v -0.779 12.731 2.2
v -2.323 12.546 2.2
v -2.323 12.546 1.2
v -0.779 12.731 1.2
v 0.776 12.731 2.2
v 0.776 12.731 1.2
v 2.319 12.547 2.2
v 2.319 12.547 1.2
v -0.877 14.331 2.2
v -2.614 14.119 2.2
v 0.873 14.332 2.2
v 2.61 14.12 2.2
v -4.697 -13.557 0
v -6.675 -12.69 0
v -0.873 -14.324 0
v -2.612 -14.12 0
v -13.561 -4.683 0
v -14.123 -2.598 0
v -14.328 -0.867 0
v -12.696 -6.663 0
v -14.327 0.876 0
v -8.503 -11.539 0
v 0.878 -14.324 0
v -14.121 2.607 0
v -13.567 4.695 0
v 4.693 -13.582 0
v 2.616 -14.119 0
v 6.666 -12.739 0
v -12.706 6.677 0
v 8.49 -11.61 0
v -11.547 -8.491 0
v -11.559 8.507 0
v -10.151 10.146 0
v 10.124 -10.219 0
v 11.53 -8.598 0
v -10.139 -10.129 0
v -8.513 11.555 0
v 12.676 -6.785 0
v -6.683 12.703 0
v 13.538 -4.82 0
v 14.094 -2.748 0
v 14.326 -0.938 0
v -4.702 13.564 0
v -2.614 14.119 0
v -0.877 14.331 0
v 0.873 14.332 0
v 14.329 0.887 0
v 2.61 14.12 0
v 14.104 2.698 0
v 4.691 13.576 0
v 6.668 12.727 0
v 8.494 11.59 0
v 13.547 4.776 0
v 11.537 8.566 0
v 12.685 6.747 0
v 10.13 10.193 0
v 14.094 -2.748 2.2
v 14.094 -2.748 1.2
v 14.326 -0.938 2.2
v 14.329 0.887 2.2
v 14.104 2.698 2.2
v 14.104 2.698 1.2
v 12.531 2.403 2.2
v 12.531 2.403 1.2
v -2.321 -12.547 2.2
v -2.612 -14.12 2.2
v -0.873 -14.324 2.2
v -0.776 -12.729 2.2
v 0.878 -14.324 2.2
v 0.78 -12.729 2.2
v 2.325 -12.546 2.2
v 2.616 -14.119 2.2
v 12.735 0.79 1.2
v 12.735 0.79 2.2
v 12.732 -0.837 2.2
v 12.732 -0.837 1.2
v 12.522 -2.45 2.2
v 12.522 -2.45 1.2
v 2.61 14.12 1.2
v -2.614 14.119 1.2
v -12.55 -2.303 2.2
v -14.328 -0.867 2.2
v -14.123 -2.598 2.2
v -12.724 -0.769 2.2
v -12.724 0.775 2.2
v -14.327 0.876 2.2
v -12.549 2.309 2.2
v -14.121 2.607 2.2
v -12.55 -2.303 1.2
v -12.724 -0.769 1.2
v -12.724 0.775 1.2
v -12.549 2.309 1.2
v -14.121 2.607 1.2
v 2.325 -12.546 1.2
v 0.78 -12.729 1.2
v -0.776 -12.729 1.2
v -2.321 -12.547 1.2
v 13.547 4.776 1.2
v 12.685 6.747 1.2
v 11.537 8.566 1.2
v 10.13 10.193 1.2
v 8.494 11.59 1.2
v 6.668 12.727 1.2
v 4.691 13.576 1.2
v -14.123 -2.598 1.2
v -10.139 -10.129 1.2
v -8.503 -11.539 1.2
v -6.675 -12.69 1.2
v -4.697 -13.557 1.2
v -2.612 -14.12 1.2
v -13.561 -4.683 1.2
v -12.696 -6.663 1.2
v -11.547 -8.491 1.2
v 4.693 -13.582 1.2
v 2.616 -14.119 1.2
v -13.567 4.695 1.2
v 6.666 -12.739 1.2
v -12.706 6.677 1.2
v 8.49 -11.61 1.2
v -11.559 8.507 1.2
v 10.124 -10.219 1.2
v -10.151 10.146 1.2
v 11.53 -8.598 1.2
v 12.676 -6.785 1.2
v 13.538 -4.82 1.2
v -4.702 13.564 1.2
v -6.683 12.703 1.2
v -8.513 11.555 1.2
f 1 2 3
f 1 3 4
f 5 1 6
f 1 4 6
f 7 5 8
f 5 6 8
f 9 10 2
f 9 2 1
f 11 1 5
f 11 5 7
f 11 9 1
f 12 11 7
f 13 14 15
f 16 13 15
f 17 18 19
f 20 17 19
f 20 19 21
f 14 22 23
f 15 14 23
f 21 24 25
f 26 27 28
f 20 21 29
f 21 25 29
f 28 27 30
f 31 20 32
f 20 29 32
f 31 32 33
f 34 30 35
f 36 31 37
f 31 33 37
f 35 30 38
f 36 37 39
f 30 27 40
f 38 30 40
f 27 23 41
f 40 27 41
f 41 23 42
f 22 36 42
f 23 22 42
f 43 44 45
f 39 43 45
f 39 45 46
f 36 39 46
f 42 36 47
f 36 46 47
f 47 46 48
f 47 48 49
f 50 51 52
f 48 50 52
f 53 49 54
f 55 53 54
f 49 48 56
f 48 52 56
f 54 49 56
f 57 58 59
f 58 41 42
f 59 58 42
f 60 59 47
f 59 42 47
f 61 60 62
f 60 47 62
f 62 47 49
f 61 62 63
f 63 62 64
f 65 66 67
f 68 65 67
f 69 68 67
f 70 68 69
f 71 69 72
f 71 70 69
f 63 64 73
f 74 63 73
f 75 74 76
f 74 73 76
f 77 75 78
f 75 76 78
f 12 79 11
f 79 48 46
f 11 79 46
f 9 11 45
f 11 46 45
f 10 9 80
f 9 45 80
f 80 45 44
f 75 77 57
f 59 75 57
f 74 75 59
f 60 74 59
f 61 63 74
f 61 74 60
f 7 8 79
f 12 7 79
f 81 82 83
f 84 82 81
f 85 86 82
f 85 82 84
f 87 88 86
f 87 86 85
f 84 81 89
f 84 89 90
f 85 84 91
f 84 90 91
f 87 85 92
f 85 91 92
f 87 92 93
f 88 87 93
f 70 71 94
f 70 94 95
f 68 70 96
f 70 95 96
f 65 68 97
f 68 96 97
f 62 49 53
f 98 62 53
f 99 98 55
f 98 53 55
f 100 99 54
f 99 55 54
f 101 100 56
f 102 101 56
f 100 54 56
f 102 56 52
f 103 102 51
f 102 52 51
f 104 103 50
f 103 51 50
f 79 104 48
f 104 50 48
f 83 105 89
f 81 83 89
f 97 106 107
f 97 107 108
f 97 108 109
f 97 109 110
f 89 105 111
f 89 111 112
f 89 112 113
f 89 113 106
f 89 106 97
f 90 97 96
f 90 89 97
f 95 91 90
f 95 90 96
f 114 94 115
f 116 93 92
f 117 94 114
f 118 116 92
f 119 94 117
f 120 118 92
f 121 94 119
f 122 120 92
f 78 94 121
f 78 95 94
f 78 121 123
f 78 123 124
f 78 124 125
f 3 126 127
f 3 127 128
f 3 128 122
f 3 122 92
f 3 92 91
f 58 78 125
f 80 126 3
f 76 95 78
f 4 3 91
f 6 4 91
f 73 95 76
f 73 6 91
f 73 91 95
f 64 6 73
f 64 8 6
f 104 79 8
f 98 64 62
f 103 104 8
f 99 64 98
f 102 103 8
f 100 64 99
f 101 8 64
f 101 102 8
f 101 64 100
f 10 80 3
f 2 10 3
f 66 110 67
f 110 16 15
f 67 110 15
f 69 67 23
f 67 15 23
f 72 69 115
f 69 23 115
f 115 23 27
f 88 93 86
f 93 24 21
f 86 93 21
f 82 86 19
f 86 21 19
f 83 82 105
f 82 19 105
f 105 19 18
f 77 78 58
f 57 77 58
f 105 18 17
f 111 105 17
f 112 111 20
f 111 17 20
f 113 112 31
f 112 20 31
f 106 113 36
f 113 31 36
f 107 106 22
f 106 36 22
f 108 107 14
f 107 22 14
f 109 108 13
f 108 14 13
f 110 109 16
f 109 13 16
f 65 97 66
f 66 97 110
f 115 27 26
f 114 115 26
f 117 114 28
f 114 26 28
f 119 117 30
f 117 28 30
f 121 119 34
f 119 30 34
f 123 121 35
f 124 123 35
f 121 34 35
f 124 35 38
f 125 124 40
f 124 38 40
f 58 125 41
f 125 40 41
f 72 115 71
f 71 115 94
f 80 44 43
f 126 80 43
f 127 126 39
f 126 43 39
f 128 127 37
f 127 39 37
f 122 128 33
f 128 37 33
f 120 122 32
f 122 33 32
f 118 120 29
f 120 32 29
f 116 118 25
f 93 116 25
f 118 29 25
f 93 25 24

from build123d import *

# Parameters (mm, degrees)
F1_DEPTH = 1.2
F2_DEPTH = 2.2


with BuildPart() as f1:
    # F0 (on Top) → F1 (new body)
    with BuildSketch(Plane.XY):
        with BuildLine():
            ThreePointArc((-2.61423, 14.119491), (-10.150846, 10.145596), (-14.120842, 2.606925))
            Line((-14.120842, 2.606925), (-12.54888, 2.308583))
            ThreePointArc((-12.54888, 2.308583), (-12.746063, 0.003032), (-12.549977, -2.302612))
            Line((-12.549977, -2.302612), (-14.122546, -2.597676))
            ThreePointArc((-14.122546, -2.597676), (-10.138682, -10.128644), (-2.611663, -14.119966))
            Line((-2.611663, -14.119966), (-2.320738, -12.546638))
            ThreePointArc((-2.320738, -12.546638), (0.002028, -12.751949), (2.324728, -12.545899))
            Line((2.324728, -12.545899), (2.616123, -14.119141))
            ThreePointArc((2.616123, -14.119141), (10.123734, -10.218797), (14.094074, -2.747967))
            Line((14.094074, -2.747967), (12.522112, -2.449625))
            ThreePointArc((12.522112, -2.449625), (12.759115, -0.023547), (12.531068, 2.40339))
            Line((12.531068, 2.40339), (14.103637, 2.698454))
            ThreePointArc((14.103637, 2.698454), (10.129638, 10.19315), (2.610249, 14.120228))
            Line((2.610249, 14.120228), (2.319324, 12.546899))
            ThreePointArc((2.319324, 12.546899), (-0.001785, 12.754501), (-2.322835, 12.54625))
            Line((-2.322835, 12.54625), (-2.61423, 14.119491))
        make_face()
    extrude(amount=F1_DEPTH)

    # F0 (on Top) → F2 (join)
    with BuildSketch(Plane.XY):
        with BuildLine():
            Line((-12.54888, 2.308583), (-14.120842, 2.606925))
            ThreePointArc((-14.120842, 2.606925), (-14.353052, 0.0047), (-14.122546, -2.597676))
            Line((-14.122546, -2.597676), (-12.549977, -2.302612))
            ThreePointArc((-12.549977, -2.302612), (-12.746063, 0.003032), (-12.54888, 2.308583))
        make_face()
        with BuildLine():
            ThreePointArc((2.610249, 14.120228), (-0.002024, 14.357977), (-2.61423, 14.119491))
            Line((-2.61423, 14.119491), (-2.322835, 12.54625))
            ThreePointArc((-2.322835, 12.54625), (-0.001785, 12.754501), (2.319324, 12.546899))
            Line((2.319324, 12.546899), (2.610249, 14.120228))
        make_face()
        with BuildLine():
            ThreePointArc((14.094074, -2.747967), (14.356041, -0.025208), (14.103637, 2.698454))
            Line((14.103637, 2.698454), (12.531068, 2.40339))
            ThreePointArc((12.531068, 2.40339), (12.759115, -0.023547), (12.522112, -2.449625))
            Line((12.522112, -2.449625), (14.094074, -2.747967))
        make_face()
        with BuildLine():
            Line((-2.320738, -12.546638), (-2.611663, -14.119966))
            ThreePointArc((-2.611663, -14.119966), (0.002266, -14.349251), (2.616123, -14.119141))
            Line((2.616123, -14.119141), (2.324728, -12.545899))
            ThreePointArc((2.324728, -12.545899), (0.002028, -12.751949), (-2.320738, -12.546638))
        make_face()
    extrude(amount=F2_DEPTH)


solid = f1.part
